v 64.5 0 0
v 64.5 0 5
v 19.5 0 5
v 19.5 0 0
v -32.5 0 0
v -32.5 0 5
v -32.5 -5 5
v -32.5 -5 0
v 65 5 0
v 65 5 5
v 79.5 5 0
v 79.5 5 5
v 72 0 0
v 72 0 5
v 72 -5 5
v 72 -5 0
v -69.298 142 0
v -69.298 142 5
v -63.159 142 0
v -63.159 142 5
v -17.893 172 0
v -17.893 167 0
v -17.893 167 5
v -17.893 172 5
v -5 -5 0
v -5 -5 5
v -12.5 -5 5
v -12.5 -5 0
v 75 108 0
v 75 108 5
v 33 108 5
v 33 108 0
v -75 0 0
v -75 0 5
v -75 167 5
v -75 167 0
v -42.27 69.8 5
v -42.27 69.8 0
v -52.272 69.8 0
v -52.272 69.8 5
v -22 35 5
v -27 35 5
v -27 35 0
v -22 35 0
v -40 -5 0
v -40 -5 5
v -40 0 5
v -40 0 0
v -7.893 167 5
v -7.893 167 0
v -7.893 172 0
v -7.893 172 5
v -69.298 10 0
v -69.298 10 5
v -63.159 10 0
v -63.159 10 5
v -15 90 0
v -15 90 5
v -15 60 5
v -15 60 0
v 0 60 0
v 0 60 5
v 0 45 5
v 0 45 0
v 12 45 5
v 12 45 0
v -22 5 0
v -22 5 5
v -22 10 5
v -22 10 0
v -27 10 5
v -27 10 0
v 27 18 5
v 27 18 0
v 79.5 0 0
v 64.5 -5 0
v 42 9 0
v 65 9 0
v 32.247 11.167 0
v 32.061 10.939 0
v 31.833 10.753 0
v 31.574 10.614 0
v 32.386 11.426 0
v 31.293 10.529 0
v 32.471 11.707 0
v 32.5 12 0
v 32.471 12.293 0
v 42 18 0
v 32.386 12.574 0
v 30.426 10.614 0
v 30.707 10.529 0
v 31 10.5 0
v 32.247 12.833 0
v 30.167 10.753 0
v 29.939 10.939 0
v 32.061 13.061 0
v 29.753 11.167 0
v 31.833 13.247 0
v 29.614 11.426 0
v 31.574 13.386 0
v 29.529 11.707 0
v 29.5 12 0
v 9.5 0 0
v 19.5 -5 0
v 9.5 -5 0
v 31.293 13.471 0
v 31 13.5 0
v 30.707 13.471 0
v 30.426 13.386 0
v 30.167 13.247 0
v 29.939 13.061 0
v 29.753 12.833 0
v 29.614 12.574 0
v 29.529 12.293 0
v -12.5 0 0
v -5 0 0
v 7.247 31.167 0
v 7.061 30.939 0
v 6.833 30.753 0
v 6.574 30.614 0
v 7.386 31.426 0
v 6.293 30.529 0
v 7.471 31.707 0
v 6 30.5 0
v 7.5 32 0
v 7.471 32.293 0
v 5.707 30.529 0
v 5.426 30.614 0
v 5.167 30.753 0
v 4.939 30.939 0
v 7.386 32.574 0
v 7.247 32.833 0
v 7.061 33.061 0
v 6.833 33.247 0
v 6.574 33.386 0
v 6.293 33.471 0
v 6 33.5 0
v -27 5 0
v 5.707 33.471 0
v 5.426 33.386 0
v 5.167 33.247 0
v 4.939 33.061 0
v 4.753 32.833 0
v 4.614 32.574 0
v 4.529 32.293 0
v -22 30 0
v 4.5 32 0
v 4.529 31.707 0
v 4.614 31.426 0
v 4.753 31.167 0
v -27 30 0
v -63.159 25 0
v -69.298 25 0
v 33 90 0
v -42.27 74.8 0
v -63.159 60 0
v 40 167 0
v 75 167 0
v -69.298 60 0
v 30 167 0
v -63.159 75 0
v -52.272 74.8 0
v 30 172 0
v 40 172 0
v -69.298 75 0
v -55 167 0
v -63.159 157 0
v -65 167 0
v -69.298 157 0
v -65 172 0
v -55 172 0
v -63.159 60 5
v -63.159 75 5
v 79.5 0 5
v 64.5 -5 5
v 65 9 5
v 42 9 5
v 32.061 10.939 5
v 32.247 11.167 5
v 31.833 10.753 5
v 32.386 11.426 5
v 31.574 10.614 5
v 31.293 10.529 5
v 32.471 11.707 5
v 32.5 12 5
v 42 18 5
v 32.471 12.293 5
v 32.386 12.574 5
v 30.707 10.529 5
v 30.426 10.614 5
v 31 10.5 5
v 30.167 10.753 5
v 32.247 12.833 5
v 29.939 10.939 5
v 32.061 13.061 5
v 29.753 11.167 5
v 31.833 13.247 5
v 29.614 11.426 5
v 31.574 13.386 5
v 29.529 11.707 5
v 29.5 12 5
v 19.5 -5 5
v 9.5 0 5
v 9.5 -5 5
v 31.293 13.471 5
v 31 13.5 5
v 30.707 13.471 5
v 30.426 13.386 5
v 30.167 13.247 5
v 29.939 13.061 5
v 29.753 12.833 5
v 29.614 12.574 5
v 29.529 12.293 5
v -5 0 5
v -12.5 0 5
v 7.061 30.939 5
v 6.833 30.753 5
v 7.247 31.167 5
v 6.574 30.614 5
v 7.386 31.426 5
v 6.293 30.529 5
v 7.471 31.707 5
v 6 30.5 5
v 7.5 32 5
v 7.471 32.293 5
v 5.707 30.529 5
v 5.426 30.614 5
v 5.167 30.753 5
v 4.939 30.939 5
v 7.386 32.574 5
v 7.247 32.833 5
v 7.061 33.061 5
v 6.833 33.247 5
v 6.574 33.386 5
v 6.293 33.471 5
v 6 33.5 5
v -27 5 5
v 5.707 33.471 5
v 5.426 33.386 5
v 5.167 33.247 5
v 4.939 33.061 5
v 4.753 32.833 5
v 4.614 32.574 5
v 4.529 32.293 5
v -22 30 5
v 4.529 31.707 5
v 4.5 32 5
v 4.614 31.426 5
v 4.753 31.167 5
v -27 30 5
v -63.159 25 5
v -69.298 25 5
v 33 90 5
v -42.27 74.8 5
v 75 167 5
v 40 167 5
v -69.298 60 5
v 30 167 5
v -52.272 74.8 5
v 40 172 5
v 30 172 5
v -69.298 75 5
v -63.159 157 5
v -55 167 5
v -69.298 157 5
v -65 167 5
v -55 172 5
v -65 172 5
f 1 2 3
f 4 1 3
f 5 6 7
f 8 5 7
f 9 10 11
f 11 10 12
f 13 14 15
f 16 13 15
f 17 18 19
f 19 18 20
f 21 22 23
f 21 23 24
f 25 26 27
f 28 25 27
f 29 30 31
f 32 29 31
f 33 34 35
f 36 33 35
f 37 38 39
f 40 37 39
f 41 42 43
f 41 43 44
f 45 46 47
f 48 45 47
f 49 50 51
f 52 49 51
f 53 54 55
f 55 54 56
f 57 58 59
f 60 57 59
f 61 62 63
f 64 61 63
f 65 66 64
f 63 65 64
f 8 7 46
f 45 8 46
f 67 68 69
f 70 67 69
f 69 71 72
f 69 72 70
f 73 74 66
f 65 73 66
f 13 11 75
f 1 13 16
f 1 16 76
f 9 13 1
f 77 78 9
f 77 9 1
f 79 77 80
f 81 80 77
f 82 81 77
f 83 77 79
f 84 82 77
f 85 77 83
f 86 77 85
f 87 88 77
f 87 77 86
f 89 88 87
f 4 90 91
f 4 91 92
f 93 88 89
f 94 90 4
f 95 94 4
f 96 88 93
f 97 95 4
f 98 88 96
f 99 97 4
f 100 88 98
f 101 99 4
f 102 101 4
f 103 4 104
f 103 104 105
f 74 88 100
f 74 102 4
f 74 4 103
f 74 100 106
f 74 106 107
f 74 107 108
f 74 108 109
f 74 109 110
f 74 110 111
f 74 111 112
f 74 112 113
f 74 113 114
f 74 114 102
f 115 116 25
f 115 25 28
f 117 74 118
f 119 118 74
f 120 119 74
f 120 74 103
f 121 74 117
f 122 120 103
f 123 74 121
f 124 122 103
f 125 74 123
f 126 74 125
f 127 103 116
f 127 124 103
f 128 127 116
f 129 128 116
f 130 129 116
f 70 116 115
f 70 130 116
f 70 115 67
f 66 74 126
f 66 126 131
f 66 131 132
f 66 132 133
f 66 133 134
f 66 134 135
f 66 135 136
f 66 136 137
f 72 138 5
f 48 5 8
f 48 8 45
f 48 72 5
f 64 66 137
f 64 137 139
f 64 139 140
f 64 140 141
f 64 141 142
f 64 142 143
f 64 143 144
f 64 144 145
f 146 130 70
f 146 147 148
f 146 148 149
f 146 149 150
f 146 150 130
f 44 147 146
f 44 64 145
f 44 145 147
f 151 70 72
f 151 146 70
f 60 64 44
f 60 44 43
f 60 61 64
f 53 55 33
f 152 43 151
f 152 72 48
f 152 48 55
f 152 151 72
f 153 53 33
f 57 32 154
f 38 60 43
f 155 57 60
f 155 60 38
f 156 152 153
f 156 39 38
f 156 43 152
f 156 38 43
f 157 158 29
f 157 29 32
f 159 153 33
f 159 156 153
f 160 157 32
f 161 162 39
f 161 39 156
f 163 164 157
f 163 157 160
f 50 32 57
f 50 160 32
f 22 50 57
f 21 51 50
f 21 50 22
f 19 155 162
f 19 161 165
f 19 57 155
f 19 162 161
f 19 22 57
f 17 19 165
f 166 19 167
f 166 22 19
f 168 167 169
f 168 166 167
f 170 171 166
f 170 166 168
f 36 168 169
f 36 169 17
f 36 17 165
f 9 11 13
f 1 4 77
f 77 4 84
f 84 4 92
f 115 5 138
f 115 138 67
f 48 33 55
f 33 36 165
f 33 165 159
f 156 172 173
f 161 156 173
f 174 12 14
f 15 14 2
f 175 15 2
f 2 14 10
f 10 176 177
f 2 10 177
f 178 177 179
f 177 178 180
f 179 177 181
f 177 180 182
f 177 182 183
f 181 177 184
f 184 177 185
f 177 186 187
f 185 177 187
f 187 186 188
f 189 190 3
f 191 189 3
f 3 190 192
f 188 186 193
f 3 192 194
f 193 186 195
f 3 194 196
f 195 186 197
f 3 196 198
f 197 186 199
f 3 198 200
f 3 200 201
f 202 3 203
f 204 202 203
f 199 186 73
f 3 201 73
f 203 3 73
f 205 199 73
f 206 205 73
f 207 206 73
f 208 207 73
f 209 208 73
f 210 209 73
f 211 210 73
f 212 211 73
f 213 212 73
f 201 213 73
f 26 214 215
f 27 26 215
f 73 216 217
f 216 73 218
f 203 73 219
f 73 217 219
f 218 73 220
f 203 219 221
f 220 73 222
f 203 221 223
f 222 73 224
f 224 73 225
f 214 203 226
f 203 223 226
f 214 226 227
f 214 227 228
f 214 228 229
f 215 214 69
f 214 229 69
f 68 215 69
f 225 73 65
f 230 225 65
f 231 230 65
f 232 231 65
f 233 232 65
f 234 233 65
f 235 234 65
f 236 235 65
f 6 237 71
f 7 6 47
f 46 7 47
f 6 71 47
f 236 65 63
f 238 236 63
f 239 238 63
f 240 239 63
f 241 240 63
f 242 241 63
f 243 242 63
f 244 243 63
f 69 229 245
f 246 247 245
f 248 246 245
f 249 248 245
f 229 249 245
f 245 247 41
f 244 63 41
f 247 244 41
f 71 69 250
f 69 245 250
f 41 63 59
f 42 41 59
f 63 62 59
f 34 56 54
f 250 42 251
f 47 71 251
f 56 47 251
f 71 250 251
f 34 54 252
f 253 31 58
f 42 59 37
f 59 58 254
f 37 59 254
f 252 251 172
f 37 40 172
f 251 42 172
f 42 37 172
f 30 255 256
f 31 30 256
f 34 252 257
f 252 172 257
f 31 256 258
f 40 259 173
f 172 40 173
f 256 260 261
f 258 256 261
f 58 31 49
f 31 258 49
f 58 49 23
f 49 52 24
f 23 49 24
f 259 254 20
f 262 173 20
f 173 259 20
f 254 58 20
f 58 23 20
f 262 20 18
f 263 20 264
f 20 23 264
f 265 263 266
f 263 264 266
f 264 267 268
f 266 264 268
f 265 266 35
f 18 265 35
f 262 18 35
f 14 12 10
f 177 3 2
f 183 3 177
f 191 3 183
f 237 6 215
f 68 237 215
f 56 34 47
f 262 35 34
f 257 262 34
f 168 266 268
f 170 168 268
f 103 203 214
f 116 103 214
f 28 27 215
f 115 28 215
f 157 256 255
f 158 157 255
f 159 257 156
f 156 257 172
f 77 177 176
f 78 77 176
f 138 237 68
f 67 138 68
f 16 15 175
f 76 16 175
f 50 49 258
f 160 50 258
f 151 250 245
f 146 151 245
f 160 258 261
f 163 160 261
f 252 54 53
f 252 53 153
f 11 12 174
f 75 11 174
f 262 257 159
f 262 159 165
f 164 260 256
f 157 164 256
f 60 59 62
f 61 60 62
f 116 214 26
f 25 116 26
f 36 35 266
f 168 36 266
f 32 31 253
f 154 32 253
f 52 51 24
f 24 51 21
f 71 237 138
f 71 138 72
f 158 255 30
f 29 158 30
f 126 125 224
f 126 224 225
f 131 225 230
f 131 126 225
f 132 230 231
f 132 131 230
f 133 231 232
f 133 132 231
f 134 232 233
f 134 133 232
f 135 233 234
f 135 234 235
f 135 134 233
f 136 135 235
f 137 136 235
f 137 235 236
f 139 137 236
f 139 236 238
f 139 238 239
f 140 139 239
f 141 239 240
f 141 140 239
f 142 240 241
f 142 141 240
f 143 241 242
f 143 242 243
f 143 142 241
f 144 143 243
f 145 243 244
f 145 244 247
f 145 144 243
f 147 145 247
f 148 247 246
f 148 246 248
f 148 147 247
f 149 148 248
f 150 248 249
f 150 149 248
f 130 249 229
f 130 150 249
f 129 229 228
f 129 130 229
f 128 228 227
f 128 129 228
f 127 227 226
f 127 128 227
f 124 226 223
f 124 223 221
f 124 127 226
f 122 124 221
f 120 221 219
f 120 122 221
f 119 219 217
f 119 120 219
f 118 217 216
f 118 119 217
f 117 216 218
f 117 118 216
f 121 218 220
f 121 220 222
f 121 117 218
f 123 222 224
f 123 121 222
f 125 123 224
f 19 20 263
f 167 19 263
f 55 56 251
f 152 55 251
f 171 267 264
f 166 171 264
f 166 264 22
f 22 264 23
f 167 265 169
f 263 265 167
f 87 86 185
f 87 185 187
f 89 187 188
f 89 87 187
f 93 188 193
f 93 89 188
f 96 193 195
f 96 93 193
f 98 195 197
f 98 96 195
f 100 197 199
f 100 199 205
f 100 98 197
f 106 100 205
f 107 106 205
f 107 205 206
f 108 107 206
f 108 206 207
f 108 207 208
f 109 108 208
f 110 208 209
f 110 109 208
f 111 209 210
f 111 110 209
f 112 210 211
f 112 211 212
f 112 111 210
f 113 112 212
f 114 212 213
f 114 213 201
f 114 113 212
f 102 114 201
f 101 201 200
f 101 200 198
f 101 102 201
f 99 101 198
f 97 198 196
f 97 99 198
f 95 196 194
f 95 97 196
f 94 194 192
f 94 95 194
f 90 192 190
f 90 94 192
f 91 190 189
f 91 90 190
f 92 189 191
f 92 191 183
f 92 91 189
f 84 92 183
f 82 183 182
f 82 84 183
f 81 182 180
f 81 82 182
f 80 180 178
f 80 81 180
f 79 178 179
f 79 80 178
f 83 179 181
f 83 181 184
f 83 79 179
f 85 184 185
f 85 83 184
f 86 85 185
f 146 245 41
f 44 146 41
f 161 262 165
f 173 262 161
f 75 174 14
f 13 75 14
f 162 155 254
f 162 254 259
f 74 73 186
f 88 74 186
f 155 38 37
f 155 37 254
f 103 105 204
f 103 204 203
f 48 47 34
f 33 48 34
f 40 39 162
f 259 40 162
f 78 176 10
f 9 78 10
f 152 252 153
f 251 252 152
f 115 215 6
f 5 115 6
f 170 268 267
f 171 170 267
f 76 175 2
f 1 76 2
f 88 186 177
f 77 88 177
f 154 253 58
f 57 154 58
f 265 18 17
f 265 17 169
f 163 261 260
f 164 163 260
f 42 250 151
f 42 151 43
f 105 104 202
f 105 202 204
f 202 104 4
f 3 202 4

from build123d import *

# Parameters (mm, degrees)
ESQUISSE1_R             = 1.5
BOSS_EXTRU_1_DEPTH      = 5
ESQUISSE2_W             = 6.138933528
ESQUISSE2_H             = 15
ESQUISSE2_W_2           = 5
ESQUISSE2_H_2           = 5
BOSS_EXTRU_2_DEPTH      = 5
ESQUISSE3_W             = 10
ESQUISSE3_H             = 5
BOSS_EXTRU_3_DEPTH      = 5
ESQUISSE4_W             = 10.001975045
ESQUISSE4_H             = 5
ENL_V_MAT_EXTRU_1_DEPTH = 10


with BuildPart() as part:
    # Esquisse1 → Boss.-Extru.1 (new body)
    with BuildSketch(Plane.XY):
        Polygon((0, 0), (37, 0), (37, 18), (27, 18), (12, 45), (0, 45), align=None)
        with Locations((6, 32)):
            Circle(ESQUISSE1_R, mode=Mode.SUBTRACT)
        with Locations((31, 12)):
            Circle(ESQUISSE1_R, mode=Mode.SUBTRACT)
    extrude(amount=BOSS_EXTRU_1_DEPTH)

    # Esquisse2 → Boss.-Extru.2 (add)
    # profile 1 of 2: a face of its own
    with BuildSketch(Plane.XY.offset(5)):
        Polygon((37, 0), (37, 18), (42, 18), (42, 9), (65, 9), (65, 5), (79.5, 5), (79.5, 0), (72, 0), (72, -5), (64.5, -5), (64.5, 0), align=None)
    # profile 2 of 2: a face of its own
    with BuildSketch(Plane.XY.offset(5)):
        Polygon((0, 0), (-5, 0), (-5, -5), (-12.5, -5), (-12.5, 0), (-32.5, 0), (-32.5, -5), (-40, -5), (-40, 0), (-75, 0), (-75, 167), (-65, 167), (-65, 172), (-55, 172), (-55, 167), (30, 167), (30, 172), (40, 172), (40, 167), (75, 167), (75, 108), (33, 108), (33, 90), (-15, 90), (-15, 60), (0, 60), align=None)
        with Locations((-66.228617731, 17.5)):
            Rectangle(ESQUISSE2_W, ESQUISSE2_H, mode=Mode.SUBTRACT)
        with Locations((-66.228617731, 67.5)):
            Rectangle(ESQUISSE2_W, ESQUISSE2_H, mode=Mode.SUBTRACT)
        with Locations((-66.228617731, 149.5)):
            Rectangle(ESQUISSE2_W, ESQUISSE2_H, mode=Mode.SUBTRACT)
        with Locations((-24.5, 7.5)):
            Rectangle(ESQUISSE2_W_2, ESQUISSE2_H_2, mode=Mode.SUBTRACT)
        with Locations((-24.5, 32.5)):
            Rectangle(ESQUISSE2_W_2, ESQUISSE2_H_2, mode=Mode.SUBTRACT)
    extrude(amount=-BOSS_EXTRU_2_DEPTH)

    # Esquisse3 → Boss.-Extru.3 (add)
    with BuildSketch(Plane(origin=(0, 0, 0), x_dir=(-1, 0, 0), z_dir=(0, 0, -1))):
        with Locations((-14.5, -2.5)):
            Rectangle(ESQUISSE3_W, ESQUISSE3_H)
        with Locations((12.893402511, 169.5)):
            Rectangle(ESQUISSE3_W, ESQUISSE3_H)
    extrude(amount=-BOSS_EXTRU_3_DEPTH)

    # Esquisse4 → Enlèv. mat.-Extru.1 (cut)
    with BuildSketch(Plane(origin=(0, 0, 0), x_dir=(-1, 0, 0), z_dir=(0, 0, -1))):
        with Locations((47.271024733, 72.3)):
            Rectangle(ESQUISSE4_W, ESQUISSE4_H)
    extrude(amount=-ENL_V_MAT_EXTRU_1_DEPTH, mode=Mode.SUBTRACT)


solid = part.part
